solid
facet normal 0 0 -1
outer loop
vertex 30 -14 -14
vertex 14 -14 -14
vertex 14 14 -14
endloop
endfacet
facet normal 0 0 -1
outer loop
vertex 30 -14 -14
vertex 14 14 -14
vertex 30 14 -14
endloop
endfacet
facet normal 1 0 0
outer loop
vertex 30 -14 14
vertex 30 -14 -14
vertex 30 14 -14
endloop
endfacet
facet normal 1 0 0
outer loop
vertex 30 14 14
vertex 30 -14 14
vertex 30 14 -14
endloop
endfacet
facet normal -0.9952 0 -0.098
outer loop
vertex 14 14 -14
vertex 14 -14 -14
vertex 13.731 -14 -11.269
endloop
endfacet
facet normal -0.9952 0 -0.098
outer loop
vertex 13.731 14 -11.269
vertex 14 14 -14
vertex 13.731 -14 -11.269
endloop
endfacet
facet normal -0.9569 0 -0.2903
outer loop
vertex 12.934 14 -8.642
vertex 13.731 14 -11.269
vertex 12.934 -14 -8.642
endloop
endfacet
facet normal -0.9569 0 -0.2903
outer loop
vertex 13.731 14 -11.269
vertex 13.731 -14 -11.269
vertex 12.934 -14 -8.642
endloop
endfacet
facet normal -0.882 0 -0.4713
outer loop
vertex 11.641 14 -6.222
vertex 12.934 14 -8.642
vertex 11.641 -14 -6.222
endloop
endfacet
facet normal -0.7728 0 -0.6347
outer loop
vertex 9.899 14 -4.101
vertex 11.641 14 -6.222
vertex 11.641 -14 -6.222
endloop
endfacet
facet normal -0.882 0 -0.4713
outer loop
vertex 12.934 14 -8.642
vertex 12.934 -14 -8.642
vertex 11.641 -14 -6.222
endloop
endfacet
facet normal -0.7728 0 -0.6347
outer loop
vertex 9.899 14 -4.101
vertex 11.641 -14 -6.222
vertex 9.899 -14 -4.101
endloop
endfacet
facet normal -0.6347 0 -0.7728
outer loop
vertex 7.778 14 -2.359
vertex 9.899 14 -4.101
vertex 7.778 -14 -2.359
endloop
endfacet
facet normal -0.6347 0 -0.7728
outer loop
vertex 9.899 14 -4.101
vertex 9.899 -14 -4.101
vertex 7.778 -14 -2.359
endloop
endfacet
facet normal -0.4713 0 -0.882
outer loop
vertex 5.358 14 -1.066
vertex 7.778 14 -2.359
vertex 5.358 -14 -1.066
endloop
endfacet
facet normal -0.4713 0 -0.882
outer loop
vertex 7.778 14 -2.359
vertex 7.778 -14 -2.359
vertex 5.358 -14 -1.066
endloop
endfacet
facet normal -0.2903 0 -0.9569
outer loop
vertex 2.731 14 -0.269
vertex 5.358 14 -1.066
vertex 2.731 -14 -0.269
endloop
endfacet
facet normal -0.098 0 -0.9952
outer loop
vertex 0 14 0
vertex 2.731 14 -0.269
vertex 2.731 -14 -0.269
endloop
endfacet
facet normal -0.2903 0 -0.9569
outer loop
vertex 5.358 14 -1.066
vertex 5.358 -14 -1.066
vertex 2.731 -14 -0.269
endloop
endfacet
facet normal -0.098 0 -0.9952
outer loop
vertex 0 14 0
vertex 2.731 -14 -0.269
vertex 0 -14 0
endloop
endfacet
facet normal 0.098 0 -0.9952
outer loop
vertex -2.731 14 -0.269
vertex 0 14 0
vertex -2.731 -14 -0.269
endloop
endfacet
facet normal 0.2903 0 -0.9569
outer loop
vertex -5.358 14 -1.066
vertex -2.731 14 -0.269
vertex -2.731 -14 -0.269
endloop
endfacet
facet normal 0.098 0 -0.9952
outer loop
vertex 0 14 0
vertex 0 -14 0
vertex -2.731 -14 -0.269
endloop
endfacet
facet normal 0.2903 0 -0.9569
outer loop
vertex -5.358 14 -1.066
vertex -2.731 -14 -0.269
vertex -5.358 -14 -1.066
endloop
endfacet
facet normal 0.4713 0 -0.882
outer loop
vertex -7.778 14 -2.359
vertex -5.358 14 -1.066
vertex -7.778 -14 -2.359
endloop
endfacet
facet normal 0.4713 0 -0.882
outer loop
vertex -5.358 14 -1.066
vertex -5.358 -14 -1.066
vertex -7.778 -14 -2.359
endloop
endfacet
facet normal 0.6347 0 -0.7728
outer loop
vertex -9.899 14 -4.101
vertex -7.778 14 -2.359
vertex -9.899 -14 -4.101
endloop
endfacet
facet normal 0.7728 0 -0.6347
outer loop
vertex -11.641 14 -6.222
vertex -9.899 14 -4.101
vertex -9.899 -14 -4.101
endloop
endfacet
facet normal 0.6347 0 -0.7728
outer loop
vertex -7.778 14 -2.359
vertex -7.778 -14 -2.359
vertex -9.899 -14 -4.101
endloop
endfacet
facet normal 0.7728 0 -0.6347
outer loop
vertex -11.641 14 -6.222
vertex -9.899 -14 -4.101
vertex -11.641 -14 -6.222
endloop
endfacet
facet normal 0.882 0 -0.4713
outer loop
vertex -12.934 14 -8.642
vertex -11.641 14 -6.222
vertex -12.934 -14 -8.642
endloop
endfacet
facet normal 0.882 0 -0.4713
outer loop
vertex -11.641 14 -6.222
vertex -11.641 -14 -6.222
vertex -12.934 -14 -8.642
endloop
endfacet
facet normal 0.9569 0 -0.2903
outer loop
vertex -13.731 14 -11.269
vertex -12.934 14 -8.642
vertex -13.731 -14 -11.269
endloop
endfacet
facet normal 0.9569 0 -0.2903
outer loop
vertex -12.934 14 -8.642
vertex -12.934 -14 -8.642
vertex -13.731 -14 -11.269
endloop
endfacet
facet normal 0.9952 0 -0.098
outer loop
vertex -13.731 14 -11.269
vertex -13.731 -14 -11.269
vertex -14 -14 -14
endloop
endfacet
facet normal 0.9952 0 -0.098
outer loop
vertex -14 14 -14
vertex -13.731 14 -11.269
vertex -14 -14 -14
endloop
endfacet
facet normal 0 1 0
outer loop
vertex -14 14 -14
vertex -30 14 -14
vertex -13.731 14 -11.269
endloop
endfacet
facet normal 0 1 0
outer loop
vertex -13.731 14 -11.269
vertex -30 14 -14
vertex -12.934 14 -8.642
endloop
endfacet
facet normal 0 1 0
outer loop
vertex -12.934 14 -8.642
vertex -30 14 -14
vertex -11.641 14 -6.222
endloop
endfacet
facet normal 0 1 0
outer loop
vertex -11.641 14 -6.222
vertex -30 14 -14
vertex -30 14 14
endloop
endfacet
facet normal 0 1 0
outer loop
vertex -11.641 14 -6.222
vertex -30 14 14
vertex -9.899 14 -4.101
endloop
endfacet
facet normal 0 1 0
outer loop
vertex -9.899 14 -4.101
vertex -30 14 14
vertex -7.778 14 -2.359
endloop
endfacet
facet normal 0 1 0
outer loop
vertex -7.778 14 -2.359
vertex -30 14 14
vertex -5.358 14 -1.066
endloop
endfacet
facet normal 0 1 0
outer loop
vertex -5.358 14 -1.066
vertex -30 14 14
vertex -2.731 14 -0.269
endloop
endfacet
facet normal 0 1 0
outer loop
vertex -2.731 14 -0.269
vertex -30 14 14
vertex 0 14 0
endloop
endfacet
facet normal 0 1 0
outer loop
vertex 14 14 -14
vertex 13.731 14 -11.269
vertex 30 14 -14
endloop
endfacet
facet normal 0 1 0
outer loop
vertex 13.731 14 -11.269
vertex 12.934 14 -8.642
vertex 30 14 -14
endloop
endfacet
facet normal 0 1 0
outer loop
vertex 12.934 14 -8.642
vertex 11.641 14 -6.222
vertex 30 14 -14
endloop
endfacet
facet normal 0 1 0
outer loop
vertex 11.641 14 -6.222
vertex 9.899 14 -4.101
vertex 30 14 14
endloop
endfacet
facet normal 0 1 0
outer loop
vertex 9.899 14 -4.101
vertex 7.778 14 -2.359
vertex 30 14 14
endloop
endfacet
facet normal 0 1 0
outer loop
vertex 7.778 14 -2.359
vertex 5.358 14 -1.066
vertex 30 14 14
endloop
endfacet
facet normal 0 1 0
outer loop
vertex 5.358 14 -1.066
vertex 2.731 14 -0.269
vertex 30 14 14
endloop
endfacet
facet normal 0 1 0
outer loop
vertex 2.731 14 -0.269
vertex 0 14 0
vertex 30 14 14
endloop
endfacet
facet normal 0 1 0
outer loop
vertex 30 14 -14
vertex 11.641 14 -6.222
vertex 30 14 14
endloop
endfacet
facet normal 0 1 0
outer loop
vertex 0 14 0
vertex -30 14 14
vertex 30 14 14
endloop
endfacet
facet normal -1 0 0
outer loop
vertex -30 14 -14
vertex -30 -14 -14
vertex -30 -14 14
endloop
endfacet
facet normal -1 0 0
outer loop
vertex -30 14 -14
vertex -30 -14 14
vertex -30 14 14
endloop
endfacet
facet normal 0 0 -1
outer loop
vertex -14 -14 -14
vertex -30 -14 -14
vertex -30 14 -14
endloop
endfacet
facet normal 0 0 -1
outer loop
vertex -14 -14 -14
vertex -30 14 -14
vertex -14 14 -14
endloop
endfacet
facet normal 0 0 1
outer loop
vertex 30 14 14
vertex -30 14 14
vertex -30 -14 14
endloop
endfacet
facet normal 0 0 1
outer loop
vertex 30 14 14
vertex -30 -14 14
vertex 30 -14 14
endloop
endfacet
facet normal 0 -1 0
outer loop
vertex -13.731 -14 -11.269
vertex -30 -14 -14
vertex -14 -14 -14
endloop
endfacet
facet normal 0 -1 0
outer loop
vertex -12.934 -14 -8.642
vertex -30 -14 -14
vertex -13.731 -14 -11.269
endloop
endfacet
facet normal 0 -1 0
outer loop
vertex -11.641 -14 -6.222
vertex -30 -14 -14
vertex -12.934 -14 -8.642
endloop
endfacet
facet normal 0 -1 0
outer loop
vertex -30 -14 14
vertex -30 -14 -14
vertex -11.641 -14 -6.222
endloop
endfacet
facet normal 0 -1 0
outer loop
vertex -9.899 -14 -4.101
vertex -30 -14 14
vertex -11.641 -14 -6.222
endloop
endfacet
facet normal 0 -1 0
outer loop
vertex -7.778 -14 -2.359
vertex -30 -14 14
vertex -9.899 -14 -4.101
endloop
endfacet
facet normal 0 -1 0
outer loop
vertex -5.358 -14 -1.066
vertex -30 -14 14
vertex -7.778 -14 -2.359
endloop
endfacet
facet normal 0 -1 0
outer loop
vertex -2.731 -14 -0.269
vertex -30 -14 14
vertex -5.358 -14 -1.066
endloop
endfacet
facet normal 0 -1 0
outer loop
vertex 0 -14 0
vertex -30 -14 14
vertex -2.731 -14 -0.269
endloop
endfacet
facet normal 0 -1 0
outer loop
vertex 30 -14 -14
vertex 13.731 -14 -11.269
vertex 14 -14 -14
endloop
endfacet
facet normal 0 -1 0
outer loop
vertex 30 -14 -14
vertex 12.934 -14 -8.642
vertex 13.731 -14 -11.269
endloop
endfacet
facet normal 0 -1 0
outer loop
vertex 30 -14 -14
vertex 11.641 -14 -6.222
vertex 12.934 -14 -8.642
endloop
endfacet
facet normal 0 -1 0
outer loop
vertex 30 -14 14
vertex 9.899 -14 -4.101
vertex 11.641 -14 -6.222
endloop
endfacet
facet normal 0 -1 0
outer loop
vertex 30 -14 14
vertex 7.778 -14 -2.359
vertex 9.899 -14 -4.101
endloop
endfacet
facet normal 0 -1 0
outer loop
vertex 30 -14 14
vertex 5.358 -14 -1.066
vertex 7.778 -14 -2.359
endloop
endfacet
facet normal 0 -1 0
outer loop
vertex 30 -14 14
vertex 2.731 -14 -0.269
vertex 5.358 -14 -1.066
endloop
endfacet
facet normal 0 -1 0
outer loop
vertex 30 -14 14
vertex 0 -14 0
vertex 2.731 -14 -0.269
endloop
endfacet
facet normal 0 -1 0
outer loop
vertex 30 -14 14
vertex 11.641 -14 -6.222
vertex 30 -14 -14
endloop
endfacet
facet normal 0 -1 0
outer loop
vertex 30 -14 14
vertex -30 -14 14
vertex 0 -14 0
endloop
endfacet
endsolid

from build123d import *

# Parameters (mm, degrees)
F0_W     = 60
F0_H     = 28
F1_DEPTH = 14
F2_R     = 14
F3_DEPTH = 50


with BuildPart() as f1:
    # F0 (on Top) → F1 (new body, symmetric)
    with BuildSketch(Plane.XY):
        Rectangle(F0_W, F0_H)
    extrude(amount=F1_DEPTH, both=True)

    # F2 (on Front) → F3 (cut, symmetric)
    with BuildSketch(Plane.XZ):
        with Locations((0, -14)):
            Circle(F2_R)
    extrude(amount=F3_DEPTH, both=True, mode=Mode.SUBTRACT)


solid = f1.part
